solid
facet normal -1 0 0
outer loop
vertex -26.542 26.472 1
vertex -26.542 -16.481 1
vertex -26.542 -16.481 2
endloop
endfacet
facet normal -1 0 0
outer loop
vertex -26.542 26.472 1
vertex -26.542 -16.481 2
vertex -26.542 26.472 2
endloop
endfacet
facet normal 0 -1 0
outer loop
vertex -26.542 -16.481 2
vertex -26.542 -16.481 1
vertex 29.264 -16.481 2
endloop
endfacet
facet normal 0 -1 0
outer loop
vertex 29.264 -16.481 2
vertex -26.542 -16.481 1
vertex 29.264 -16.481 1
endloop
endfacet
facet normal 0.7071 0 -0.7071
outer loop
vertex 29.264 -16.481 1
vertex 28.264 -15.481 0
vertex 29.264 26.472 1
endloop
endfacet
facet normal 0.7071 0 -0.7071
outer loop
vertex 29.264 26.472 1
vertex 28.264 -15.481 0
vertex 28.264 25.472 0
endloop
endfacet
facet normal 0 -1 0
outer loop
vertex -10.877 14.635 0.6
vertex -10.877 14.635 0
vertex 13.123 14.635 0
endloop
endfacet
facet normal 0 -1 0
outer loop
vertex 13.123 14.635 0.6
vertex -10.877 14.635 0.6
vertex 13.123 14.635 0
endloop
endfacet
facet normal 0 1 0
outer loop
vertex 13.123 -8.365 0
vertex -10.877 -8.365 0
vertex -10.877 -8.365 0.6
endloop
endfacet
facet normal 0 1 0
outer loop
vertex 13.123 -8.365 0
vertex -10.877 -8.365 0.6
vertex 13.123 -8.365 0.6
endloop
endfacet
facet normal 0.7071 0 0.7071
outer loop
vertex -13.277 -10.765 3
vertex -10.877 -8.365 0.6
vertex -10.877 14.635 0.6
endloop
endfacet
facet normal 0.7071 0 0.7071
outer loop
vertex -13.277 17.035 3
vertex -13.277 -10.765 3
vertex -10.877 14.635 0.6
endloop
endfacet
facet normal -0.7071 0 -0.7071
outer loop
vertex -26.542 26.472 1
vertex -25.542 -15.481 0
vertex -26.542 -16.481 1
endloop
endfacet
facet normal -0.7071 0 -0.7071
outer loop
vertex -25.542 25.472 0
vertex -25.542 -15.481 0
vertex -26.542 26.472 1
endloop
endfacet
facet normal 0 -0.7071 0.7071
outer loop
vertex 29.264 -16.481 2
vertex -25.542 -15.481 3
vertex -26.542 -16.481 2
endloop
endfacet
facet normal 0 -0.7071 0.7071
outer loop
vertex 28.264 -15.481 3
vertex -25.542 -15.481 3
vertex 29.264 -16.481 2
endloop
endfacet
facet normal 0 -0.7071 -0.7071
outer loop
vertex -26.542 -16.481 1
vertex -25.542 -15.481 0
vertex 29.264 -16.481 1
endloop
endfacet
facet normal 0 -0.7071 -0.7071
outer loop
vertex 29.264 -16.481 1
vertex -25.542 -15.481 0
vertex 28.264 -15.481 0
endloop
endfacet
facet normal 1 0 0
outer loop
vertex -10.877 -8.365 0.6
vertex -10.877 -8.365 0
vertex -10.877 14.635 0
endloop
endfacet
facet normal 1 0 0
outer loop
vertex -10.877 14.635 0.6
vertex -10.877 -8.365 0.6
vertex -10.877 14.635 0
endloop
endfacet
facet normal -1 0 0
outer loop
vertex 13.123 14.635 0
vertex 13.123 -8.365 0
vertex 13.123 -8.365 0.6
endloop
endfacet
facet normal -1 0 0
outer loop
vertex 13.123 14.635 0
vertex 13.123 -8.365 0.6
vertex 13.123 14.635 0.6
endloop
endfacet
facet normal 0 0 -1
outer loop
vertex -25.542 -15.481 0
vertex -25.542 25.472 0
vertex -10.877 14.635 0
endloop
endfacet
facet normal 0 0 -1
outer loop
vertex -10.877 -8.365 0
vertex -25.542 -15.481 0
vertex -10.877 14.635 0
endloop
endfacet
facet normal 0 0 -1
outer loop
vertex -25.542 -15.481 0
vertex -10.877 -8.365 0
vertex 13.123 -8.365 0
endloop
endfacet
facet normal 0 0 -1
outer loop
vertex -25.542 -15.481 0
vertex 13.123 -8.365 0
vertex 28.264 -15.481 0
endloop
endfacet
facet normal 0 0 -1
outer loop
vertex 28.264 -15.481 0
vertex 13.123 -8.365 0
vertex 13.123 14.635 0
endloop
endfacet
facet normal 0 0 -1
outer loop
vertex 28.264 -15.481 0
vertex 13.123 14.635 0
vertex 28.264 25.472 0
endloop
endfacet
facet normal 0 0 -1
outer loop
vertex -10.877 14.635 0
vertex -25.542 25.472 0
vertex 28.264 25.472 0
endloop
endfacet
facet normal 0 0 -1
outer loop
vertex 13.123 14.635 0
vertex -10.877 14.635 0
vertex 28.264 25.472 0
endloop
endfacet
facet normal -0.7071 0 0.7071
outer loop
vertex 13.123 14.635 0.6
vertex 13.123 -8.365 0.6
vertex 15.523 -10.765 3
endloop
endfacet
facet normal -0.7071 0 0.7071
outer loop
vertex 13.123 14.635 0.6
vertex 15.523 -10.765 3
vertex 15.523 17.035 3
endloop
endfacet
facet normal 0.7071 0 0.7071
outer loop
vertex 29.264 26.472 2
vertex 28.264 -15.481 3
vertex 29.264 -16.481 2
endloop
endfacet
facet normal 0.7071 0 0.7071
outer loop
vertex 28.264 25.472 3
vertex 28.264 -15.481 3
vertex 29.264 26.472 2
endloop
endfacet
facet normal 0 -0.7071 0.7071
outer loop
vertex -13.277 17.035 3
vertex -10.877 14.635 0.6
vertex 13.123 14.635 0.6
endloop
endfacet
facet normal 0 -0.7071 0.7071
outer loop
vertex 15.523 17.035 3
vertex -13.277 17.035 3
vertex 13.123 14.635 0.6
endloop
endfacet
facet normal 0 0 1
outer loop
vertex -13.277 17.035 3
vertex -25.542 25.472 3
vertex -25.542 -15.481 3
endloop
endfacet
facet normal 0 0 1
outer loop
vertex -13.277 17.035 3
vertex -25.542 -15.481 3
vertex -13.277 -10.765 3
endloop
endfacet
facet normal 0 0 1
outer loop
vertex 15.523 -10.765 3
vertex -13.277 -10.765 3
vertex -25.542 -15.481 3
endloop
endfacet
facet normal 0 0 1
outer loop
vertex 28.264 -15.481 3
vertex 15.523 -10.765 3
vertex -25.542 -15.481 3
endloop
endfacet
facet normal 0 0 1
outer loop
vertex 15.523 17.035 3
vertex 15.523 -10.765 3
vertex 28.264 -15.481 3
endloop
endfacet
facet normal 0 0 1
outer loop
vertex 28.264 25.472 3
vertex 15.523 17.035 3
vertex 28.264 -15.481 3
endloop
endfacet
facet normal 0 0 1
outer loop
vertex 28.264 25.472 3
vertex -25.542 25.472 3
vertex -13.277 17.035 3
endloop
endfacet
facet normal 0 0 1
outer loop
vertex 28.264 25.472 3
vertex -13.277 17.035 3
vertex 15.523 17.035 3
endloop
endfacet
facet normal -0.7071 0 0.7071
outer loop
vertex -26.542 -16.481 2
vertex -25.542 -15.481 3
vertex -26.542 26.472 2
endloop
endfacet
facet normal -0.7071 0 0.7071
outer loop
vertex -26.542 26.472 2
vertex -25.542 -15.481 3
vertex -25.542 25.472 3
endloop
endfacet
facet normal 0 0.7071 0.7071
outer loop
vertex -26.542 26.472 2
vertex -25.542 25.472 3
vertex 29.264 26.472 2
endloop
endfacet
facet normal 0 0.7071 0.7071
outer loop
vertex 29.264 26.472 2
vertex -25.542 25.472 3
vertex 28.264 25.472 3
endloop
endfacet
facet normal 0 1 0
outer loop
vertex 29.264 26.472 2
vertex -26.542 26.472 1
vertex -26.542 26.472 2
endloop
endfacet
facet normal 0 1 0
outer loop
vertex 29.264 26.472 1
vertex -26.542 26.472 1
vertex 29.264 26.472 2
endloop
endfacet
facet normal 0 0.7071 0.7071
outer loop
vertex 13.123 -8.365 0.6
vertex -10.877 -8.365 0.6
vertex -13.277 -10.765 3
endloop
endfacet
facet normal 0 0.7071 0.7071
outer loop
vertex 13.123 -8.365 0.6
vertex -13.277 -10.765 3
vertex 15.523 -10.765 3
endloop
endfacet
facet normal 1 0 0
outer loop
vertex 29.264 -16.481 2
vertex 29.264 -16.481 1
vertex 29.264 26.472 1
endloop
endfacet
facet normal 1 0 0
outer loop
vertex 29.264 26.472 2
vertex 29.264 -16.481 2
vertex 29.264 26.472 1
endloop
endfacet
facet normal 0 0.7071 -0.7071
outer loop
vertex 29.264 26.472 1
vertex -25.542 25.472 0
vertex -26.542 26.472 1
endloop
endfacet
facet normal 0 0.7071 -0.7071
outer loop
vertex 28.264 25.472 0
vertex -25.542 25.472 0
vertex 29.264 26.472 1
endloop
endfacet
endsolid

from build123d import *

# Parameters (mm, degrees)
SKETCH006_W     = 55.805504
SKETCH006_H     = 42.953331
SKETCH006_W_2   = 24
SKETCH006_H_2   = 23
PAD003_DEPTH    = 3
CHAMFER001_SIZE = 1
CHAMFER002_SIZE = 2.4


with BuildPart() as part:
    # Sketch006 → Pad003 (new body)
    with BuildSketch(Plane.XY):
        with Locations((1.3612, 4.995676)):
            Rectangle(SKETCH006_W, SKETCH006_H)
        with Locations((1.122957, 3.1348)):
            Rectangle(SKETCH006_W_2, SKETCH006_H_2, mode=Mode.SUBTRACT)
    extrude(amount=PAD003_DEPTH)

    # Chamfer001
    chamfer001_edges = [part.edges().sort_by_distance(p)[0] for p in [
        (1.3612, -16.480989, 3),
        (29.263952, 4.995676, 3),
        (1.3612, 26.472342, 3),
        (-26.541552, 4.995677, 3),
        (1.3612, -16.480989, 0),
        (29.263952, 4.995676, 0),
        (1.3612, 26.472342, 0),
        (-26.541552, 4.995677, 0),
    ]]
    chamfer(chamfer001_edges, length=CHAMFER001_SIZE)

    # Chamfer002
    chamfer002_edges = [part.edges().sort_by_distance(p)[0] for p in [
        (1.122957, 14.6348, 3),
        (13.122957, 3.1348, 3),
        (1.122957, -8.3652, 3),
        (-10.877043, 3.1348, 3),
    ]]
    chamfer(chamfer002_edges, length=CHAMFER002_SIZE)


solid = part.part
